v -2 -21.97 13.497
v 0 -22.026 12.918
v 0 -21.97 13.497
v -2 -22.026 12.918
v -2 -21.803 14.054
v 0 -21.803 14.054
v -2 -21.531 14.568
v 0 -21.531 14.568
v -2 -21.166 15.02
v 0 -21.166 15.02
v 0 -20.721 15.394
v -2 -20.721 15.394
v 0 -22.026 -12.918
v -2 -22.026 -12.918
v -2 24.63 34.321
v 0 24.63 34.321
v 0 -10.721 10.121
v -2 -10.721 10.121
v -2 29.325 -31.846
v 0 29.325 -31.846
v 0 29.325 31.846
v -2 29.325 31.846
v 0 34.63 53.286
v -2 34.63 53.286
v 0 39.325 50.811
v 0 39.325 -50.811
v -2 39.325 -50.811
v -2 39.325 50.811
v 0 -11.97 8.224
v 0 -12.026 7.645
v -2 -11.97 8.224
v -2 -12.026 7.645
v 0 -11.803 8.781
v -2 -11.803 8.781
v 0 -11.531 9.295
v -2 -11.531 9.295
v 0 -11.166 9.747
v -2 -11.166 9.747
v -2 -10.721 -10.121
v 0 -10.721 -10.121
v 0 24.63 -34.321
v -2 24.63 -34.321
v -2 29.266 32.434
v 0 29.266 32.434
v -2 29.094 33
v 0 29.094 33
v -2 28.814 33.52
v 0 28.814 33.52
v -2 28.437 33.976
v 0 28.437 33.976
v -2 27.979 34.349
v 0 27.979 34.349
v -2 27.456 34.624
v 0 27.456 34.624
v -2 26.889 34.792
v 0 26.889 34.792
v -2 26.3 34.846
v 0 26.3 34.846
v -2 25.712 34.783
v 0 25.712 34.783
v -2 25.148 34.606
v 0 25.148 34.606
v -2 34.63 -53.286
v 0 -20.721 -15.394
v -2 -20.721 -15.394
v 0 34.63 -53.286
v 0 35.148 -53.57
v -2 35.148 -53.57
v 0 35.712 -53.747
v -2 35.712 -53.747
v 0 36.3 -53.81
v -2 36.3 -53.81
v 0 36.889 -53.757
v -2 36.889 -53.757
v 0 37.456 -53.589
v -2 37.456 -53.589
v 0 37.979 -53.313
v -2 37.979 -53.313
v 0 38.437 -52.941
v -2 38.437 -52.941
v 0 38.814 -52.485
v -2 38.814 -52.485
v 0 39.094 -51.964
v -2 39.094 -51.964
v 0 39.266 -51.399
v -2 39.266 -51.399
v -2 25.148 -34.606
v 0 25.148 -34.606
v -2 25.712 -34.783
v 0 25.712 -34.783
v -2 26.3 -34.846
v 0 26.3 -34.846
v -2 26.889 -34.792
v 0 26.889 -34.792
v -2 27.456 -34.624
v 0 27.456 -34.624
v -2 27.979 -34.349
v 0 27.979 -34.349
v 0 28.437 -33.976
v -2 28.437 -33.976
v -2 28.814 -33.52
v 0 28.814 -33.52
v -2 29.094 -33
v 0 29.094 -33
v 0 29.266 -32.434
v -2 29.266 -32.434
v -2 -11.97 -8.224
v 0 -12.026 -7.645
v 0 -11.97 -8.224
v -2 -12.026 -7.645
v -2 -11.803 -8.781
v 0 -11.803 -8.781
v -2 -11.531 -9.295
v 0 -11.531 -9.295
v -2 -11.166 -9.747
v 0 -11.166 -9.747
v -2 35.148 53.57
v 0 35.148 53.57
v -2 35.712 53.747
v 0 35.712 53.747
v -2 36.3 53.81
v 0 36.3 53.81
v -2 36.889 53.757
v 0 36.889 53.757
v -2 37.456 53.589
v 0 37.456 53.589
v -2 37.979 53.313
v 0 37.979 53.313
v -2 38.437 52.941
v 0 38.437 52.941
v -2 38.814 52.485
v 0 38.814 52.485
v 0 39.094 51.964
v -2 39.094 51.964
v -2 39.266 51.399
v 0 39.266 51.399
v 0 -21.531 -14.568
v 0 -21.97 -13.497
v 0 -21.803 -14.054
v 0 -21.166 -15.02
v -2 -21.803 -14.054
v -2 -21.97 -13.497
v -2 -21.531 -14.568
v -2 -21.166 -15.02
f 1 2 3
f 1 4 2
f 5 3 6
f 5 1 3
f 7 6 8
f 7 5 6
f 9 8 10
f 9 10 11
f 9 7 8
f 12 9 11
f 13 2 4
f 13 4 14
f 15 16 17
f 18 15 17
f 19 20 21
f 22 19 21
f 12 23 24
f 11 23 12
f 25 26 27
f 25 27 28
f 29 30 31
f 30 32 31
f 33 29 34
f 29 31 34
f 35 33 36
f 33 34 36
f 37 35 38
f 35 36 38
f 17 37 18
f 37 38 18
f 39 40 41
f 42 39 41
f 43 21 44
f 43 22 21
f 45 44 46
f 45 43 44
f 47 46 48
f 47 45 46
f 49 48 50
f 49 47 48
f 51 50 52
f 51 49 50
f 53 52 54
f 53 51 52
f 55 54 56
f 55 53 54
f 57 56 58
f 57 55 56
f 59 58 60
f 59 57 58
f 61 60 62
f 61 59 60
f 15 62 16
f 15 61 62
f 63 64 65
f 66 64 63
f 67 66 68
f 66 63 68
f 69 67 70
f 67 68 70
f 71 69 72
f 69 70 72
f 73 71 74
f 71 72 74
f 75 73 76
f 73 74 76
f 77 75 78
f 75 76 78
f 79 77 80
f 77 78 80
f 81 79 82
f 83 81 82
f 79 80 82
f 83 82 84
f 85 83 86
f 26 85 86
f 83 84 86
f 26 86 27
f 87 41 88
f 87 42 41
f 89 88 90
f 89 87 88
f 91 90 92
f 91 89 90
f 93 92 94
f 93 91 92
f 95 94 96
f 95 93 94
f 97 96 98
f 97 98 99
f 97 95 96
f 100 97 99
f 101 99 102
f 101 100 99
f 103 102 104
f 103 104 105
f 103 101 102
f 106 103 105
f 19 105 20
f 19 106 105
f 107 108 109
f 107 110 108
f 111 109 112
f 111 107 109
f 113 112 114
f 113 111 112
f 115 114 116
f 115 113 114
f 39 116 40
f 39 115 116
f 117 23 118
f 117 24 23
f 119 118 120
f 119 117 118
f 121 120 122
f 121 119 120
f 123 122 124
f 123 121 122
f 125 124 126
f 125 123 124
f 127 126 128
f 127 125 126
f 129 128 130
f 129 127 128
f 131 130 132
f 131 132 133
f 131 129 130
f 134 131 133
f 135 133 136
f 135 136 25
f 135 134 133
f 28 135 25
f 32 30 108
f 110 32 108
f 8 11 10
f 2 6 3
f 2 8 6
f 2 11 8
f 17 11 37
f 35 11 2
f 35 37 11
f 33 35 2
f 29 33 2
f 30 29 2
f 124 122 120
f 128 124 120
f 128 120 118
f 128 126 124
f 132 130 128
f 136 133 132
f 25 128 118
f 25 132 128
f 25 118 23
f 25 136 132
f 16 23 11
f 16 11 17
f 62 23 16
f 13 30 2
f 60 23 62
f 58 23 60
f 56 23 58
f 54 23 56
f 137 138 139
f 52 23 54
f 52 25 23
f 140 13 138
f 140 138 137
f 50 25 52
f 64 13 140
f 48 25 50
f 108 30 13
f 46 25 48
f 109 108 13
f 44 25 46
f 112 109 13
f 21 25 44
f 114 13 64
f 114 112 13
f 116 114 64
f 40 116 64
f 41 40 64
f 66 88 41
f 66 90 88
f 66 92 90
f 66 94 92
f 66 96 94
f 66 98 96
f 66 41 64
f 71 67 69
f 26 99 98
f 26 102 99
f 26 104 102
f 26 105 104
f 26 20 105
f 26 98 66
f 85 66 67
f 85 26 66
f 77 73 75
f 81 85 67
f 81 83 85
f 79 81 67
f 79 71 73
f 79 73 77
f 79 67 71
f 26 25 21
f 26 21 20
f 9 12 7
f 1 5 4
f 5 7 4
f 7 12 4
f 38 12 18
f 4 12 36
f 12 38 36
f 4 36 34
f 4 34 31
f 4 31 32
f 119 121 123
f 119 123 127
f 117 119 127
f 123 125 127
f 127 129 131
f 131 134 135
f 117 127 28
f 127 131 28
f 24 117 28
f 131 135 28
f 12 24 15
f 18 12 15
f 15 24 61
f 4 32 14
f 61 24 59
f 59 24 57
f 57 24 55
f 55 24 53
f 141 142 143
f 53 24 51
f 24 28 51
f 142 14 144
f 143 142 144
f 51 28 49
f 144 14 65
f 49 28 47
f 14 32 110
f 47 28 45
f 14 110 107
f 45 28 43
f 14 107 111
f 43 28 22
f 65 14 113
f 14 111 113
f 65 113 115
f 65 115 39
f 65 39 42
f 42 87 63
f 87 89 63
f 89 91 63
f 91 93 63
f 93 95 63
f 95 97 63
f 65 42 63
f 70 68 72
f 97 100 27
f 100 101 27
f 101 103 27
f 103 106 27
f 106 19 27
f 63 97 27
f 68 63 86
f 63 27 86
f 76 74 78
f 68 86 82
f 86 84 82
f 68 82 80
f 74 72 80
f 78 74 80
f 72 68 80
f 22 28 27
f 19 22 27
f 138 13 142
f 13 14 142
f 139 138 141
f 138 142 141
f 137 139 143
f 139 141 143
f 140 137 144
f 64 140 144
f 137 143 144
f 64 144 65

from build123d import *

# Parameters (mm, degrees)
BASE_FLANGE1_DEPTH = 2
FILLET1_R          = 3


# Sheet-metal steps are written as plain solids
with BuildPart() as part:
    # Sketch1 → Base-Flange1 (new body)
    with BuildSketch(Plane(origin=(0, 0, 0), x_dir=(0, 0, -1), z_dir=(1, 0, 0))):
        Polygon((-14.5, -22.025862069), (14.5, -22.025862069), (56.5, 39.324712644), (-56.5, 39.324712644), align=None)
        Polygon((-9.227058078, -12.025862069), (9.227058078, -12.025862069), (37.5352548, 29.324712644), (-37.5352548, 29.324712644), align=None, mode=Mode.SUBTRACT)
    extrude(amount=-BASE_FLANGE1_DEPTH)

    # Fillet1
    fillet1_edges = [part.edges().sort_by_distance(p)[0] for p in [
        (-1, 29.324712644, -37.5352548),
        (-1, -12.025862069, -9.227058078),
        (-1, -12.025862069, 9.227058078),
        (-1, 29.324712644, 37.5352548),
        (-1, -22.025862069, -14.5),
        (-1, -22.025862069, 14.5),
        (-1, 39.324712644, 56.5),
        (-1, 39.324712644, -56.5),
    ]]
    fillet(fillet1_edges, radius=FILLET1_R)


solid = part.part
